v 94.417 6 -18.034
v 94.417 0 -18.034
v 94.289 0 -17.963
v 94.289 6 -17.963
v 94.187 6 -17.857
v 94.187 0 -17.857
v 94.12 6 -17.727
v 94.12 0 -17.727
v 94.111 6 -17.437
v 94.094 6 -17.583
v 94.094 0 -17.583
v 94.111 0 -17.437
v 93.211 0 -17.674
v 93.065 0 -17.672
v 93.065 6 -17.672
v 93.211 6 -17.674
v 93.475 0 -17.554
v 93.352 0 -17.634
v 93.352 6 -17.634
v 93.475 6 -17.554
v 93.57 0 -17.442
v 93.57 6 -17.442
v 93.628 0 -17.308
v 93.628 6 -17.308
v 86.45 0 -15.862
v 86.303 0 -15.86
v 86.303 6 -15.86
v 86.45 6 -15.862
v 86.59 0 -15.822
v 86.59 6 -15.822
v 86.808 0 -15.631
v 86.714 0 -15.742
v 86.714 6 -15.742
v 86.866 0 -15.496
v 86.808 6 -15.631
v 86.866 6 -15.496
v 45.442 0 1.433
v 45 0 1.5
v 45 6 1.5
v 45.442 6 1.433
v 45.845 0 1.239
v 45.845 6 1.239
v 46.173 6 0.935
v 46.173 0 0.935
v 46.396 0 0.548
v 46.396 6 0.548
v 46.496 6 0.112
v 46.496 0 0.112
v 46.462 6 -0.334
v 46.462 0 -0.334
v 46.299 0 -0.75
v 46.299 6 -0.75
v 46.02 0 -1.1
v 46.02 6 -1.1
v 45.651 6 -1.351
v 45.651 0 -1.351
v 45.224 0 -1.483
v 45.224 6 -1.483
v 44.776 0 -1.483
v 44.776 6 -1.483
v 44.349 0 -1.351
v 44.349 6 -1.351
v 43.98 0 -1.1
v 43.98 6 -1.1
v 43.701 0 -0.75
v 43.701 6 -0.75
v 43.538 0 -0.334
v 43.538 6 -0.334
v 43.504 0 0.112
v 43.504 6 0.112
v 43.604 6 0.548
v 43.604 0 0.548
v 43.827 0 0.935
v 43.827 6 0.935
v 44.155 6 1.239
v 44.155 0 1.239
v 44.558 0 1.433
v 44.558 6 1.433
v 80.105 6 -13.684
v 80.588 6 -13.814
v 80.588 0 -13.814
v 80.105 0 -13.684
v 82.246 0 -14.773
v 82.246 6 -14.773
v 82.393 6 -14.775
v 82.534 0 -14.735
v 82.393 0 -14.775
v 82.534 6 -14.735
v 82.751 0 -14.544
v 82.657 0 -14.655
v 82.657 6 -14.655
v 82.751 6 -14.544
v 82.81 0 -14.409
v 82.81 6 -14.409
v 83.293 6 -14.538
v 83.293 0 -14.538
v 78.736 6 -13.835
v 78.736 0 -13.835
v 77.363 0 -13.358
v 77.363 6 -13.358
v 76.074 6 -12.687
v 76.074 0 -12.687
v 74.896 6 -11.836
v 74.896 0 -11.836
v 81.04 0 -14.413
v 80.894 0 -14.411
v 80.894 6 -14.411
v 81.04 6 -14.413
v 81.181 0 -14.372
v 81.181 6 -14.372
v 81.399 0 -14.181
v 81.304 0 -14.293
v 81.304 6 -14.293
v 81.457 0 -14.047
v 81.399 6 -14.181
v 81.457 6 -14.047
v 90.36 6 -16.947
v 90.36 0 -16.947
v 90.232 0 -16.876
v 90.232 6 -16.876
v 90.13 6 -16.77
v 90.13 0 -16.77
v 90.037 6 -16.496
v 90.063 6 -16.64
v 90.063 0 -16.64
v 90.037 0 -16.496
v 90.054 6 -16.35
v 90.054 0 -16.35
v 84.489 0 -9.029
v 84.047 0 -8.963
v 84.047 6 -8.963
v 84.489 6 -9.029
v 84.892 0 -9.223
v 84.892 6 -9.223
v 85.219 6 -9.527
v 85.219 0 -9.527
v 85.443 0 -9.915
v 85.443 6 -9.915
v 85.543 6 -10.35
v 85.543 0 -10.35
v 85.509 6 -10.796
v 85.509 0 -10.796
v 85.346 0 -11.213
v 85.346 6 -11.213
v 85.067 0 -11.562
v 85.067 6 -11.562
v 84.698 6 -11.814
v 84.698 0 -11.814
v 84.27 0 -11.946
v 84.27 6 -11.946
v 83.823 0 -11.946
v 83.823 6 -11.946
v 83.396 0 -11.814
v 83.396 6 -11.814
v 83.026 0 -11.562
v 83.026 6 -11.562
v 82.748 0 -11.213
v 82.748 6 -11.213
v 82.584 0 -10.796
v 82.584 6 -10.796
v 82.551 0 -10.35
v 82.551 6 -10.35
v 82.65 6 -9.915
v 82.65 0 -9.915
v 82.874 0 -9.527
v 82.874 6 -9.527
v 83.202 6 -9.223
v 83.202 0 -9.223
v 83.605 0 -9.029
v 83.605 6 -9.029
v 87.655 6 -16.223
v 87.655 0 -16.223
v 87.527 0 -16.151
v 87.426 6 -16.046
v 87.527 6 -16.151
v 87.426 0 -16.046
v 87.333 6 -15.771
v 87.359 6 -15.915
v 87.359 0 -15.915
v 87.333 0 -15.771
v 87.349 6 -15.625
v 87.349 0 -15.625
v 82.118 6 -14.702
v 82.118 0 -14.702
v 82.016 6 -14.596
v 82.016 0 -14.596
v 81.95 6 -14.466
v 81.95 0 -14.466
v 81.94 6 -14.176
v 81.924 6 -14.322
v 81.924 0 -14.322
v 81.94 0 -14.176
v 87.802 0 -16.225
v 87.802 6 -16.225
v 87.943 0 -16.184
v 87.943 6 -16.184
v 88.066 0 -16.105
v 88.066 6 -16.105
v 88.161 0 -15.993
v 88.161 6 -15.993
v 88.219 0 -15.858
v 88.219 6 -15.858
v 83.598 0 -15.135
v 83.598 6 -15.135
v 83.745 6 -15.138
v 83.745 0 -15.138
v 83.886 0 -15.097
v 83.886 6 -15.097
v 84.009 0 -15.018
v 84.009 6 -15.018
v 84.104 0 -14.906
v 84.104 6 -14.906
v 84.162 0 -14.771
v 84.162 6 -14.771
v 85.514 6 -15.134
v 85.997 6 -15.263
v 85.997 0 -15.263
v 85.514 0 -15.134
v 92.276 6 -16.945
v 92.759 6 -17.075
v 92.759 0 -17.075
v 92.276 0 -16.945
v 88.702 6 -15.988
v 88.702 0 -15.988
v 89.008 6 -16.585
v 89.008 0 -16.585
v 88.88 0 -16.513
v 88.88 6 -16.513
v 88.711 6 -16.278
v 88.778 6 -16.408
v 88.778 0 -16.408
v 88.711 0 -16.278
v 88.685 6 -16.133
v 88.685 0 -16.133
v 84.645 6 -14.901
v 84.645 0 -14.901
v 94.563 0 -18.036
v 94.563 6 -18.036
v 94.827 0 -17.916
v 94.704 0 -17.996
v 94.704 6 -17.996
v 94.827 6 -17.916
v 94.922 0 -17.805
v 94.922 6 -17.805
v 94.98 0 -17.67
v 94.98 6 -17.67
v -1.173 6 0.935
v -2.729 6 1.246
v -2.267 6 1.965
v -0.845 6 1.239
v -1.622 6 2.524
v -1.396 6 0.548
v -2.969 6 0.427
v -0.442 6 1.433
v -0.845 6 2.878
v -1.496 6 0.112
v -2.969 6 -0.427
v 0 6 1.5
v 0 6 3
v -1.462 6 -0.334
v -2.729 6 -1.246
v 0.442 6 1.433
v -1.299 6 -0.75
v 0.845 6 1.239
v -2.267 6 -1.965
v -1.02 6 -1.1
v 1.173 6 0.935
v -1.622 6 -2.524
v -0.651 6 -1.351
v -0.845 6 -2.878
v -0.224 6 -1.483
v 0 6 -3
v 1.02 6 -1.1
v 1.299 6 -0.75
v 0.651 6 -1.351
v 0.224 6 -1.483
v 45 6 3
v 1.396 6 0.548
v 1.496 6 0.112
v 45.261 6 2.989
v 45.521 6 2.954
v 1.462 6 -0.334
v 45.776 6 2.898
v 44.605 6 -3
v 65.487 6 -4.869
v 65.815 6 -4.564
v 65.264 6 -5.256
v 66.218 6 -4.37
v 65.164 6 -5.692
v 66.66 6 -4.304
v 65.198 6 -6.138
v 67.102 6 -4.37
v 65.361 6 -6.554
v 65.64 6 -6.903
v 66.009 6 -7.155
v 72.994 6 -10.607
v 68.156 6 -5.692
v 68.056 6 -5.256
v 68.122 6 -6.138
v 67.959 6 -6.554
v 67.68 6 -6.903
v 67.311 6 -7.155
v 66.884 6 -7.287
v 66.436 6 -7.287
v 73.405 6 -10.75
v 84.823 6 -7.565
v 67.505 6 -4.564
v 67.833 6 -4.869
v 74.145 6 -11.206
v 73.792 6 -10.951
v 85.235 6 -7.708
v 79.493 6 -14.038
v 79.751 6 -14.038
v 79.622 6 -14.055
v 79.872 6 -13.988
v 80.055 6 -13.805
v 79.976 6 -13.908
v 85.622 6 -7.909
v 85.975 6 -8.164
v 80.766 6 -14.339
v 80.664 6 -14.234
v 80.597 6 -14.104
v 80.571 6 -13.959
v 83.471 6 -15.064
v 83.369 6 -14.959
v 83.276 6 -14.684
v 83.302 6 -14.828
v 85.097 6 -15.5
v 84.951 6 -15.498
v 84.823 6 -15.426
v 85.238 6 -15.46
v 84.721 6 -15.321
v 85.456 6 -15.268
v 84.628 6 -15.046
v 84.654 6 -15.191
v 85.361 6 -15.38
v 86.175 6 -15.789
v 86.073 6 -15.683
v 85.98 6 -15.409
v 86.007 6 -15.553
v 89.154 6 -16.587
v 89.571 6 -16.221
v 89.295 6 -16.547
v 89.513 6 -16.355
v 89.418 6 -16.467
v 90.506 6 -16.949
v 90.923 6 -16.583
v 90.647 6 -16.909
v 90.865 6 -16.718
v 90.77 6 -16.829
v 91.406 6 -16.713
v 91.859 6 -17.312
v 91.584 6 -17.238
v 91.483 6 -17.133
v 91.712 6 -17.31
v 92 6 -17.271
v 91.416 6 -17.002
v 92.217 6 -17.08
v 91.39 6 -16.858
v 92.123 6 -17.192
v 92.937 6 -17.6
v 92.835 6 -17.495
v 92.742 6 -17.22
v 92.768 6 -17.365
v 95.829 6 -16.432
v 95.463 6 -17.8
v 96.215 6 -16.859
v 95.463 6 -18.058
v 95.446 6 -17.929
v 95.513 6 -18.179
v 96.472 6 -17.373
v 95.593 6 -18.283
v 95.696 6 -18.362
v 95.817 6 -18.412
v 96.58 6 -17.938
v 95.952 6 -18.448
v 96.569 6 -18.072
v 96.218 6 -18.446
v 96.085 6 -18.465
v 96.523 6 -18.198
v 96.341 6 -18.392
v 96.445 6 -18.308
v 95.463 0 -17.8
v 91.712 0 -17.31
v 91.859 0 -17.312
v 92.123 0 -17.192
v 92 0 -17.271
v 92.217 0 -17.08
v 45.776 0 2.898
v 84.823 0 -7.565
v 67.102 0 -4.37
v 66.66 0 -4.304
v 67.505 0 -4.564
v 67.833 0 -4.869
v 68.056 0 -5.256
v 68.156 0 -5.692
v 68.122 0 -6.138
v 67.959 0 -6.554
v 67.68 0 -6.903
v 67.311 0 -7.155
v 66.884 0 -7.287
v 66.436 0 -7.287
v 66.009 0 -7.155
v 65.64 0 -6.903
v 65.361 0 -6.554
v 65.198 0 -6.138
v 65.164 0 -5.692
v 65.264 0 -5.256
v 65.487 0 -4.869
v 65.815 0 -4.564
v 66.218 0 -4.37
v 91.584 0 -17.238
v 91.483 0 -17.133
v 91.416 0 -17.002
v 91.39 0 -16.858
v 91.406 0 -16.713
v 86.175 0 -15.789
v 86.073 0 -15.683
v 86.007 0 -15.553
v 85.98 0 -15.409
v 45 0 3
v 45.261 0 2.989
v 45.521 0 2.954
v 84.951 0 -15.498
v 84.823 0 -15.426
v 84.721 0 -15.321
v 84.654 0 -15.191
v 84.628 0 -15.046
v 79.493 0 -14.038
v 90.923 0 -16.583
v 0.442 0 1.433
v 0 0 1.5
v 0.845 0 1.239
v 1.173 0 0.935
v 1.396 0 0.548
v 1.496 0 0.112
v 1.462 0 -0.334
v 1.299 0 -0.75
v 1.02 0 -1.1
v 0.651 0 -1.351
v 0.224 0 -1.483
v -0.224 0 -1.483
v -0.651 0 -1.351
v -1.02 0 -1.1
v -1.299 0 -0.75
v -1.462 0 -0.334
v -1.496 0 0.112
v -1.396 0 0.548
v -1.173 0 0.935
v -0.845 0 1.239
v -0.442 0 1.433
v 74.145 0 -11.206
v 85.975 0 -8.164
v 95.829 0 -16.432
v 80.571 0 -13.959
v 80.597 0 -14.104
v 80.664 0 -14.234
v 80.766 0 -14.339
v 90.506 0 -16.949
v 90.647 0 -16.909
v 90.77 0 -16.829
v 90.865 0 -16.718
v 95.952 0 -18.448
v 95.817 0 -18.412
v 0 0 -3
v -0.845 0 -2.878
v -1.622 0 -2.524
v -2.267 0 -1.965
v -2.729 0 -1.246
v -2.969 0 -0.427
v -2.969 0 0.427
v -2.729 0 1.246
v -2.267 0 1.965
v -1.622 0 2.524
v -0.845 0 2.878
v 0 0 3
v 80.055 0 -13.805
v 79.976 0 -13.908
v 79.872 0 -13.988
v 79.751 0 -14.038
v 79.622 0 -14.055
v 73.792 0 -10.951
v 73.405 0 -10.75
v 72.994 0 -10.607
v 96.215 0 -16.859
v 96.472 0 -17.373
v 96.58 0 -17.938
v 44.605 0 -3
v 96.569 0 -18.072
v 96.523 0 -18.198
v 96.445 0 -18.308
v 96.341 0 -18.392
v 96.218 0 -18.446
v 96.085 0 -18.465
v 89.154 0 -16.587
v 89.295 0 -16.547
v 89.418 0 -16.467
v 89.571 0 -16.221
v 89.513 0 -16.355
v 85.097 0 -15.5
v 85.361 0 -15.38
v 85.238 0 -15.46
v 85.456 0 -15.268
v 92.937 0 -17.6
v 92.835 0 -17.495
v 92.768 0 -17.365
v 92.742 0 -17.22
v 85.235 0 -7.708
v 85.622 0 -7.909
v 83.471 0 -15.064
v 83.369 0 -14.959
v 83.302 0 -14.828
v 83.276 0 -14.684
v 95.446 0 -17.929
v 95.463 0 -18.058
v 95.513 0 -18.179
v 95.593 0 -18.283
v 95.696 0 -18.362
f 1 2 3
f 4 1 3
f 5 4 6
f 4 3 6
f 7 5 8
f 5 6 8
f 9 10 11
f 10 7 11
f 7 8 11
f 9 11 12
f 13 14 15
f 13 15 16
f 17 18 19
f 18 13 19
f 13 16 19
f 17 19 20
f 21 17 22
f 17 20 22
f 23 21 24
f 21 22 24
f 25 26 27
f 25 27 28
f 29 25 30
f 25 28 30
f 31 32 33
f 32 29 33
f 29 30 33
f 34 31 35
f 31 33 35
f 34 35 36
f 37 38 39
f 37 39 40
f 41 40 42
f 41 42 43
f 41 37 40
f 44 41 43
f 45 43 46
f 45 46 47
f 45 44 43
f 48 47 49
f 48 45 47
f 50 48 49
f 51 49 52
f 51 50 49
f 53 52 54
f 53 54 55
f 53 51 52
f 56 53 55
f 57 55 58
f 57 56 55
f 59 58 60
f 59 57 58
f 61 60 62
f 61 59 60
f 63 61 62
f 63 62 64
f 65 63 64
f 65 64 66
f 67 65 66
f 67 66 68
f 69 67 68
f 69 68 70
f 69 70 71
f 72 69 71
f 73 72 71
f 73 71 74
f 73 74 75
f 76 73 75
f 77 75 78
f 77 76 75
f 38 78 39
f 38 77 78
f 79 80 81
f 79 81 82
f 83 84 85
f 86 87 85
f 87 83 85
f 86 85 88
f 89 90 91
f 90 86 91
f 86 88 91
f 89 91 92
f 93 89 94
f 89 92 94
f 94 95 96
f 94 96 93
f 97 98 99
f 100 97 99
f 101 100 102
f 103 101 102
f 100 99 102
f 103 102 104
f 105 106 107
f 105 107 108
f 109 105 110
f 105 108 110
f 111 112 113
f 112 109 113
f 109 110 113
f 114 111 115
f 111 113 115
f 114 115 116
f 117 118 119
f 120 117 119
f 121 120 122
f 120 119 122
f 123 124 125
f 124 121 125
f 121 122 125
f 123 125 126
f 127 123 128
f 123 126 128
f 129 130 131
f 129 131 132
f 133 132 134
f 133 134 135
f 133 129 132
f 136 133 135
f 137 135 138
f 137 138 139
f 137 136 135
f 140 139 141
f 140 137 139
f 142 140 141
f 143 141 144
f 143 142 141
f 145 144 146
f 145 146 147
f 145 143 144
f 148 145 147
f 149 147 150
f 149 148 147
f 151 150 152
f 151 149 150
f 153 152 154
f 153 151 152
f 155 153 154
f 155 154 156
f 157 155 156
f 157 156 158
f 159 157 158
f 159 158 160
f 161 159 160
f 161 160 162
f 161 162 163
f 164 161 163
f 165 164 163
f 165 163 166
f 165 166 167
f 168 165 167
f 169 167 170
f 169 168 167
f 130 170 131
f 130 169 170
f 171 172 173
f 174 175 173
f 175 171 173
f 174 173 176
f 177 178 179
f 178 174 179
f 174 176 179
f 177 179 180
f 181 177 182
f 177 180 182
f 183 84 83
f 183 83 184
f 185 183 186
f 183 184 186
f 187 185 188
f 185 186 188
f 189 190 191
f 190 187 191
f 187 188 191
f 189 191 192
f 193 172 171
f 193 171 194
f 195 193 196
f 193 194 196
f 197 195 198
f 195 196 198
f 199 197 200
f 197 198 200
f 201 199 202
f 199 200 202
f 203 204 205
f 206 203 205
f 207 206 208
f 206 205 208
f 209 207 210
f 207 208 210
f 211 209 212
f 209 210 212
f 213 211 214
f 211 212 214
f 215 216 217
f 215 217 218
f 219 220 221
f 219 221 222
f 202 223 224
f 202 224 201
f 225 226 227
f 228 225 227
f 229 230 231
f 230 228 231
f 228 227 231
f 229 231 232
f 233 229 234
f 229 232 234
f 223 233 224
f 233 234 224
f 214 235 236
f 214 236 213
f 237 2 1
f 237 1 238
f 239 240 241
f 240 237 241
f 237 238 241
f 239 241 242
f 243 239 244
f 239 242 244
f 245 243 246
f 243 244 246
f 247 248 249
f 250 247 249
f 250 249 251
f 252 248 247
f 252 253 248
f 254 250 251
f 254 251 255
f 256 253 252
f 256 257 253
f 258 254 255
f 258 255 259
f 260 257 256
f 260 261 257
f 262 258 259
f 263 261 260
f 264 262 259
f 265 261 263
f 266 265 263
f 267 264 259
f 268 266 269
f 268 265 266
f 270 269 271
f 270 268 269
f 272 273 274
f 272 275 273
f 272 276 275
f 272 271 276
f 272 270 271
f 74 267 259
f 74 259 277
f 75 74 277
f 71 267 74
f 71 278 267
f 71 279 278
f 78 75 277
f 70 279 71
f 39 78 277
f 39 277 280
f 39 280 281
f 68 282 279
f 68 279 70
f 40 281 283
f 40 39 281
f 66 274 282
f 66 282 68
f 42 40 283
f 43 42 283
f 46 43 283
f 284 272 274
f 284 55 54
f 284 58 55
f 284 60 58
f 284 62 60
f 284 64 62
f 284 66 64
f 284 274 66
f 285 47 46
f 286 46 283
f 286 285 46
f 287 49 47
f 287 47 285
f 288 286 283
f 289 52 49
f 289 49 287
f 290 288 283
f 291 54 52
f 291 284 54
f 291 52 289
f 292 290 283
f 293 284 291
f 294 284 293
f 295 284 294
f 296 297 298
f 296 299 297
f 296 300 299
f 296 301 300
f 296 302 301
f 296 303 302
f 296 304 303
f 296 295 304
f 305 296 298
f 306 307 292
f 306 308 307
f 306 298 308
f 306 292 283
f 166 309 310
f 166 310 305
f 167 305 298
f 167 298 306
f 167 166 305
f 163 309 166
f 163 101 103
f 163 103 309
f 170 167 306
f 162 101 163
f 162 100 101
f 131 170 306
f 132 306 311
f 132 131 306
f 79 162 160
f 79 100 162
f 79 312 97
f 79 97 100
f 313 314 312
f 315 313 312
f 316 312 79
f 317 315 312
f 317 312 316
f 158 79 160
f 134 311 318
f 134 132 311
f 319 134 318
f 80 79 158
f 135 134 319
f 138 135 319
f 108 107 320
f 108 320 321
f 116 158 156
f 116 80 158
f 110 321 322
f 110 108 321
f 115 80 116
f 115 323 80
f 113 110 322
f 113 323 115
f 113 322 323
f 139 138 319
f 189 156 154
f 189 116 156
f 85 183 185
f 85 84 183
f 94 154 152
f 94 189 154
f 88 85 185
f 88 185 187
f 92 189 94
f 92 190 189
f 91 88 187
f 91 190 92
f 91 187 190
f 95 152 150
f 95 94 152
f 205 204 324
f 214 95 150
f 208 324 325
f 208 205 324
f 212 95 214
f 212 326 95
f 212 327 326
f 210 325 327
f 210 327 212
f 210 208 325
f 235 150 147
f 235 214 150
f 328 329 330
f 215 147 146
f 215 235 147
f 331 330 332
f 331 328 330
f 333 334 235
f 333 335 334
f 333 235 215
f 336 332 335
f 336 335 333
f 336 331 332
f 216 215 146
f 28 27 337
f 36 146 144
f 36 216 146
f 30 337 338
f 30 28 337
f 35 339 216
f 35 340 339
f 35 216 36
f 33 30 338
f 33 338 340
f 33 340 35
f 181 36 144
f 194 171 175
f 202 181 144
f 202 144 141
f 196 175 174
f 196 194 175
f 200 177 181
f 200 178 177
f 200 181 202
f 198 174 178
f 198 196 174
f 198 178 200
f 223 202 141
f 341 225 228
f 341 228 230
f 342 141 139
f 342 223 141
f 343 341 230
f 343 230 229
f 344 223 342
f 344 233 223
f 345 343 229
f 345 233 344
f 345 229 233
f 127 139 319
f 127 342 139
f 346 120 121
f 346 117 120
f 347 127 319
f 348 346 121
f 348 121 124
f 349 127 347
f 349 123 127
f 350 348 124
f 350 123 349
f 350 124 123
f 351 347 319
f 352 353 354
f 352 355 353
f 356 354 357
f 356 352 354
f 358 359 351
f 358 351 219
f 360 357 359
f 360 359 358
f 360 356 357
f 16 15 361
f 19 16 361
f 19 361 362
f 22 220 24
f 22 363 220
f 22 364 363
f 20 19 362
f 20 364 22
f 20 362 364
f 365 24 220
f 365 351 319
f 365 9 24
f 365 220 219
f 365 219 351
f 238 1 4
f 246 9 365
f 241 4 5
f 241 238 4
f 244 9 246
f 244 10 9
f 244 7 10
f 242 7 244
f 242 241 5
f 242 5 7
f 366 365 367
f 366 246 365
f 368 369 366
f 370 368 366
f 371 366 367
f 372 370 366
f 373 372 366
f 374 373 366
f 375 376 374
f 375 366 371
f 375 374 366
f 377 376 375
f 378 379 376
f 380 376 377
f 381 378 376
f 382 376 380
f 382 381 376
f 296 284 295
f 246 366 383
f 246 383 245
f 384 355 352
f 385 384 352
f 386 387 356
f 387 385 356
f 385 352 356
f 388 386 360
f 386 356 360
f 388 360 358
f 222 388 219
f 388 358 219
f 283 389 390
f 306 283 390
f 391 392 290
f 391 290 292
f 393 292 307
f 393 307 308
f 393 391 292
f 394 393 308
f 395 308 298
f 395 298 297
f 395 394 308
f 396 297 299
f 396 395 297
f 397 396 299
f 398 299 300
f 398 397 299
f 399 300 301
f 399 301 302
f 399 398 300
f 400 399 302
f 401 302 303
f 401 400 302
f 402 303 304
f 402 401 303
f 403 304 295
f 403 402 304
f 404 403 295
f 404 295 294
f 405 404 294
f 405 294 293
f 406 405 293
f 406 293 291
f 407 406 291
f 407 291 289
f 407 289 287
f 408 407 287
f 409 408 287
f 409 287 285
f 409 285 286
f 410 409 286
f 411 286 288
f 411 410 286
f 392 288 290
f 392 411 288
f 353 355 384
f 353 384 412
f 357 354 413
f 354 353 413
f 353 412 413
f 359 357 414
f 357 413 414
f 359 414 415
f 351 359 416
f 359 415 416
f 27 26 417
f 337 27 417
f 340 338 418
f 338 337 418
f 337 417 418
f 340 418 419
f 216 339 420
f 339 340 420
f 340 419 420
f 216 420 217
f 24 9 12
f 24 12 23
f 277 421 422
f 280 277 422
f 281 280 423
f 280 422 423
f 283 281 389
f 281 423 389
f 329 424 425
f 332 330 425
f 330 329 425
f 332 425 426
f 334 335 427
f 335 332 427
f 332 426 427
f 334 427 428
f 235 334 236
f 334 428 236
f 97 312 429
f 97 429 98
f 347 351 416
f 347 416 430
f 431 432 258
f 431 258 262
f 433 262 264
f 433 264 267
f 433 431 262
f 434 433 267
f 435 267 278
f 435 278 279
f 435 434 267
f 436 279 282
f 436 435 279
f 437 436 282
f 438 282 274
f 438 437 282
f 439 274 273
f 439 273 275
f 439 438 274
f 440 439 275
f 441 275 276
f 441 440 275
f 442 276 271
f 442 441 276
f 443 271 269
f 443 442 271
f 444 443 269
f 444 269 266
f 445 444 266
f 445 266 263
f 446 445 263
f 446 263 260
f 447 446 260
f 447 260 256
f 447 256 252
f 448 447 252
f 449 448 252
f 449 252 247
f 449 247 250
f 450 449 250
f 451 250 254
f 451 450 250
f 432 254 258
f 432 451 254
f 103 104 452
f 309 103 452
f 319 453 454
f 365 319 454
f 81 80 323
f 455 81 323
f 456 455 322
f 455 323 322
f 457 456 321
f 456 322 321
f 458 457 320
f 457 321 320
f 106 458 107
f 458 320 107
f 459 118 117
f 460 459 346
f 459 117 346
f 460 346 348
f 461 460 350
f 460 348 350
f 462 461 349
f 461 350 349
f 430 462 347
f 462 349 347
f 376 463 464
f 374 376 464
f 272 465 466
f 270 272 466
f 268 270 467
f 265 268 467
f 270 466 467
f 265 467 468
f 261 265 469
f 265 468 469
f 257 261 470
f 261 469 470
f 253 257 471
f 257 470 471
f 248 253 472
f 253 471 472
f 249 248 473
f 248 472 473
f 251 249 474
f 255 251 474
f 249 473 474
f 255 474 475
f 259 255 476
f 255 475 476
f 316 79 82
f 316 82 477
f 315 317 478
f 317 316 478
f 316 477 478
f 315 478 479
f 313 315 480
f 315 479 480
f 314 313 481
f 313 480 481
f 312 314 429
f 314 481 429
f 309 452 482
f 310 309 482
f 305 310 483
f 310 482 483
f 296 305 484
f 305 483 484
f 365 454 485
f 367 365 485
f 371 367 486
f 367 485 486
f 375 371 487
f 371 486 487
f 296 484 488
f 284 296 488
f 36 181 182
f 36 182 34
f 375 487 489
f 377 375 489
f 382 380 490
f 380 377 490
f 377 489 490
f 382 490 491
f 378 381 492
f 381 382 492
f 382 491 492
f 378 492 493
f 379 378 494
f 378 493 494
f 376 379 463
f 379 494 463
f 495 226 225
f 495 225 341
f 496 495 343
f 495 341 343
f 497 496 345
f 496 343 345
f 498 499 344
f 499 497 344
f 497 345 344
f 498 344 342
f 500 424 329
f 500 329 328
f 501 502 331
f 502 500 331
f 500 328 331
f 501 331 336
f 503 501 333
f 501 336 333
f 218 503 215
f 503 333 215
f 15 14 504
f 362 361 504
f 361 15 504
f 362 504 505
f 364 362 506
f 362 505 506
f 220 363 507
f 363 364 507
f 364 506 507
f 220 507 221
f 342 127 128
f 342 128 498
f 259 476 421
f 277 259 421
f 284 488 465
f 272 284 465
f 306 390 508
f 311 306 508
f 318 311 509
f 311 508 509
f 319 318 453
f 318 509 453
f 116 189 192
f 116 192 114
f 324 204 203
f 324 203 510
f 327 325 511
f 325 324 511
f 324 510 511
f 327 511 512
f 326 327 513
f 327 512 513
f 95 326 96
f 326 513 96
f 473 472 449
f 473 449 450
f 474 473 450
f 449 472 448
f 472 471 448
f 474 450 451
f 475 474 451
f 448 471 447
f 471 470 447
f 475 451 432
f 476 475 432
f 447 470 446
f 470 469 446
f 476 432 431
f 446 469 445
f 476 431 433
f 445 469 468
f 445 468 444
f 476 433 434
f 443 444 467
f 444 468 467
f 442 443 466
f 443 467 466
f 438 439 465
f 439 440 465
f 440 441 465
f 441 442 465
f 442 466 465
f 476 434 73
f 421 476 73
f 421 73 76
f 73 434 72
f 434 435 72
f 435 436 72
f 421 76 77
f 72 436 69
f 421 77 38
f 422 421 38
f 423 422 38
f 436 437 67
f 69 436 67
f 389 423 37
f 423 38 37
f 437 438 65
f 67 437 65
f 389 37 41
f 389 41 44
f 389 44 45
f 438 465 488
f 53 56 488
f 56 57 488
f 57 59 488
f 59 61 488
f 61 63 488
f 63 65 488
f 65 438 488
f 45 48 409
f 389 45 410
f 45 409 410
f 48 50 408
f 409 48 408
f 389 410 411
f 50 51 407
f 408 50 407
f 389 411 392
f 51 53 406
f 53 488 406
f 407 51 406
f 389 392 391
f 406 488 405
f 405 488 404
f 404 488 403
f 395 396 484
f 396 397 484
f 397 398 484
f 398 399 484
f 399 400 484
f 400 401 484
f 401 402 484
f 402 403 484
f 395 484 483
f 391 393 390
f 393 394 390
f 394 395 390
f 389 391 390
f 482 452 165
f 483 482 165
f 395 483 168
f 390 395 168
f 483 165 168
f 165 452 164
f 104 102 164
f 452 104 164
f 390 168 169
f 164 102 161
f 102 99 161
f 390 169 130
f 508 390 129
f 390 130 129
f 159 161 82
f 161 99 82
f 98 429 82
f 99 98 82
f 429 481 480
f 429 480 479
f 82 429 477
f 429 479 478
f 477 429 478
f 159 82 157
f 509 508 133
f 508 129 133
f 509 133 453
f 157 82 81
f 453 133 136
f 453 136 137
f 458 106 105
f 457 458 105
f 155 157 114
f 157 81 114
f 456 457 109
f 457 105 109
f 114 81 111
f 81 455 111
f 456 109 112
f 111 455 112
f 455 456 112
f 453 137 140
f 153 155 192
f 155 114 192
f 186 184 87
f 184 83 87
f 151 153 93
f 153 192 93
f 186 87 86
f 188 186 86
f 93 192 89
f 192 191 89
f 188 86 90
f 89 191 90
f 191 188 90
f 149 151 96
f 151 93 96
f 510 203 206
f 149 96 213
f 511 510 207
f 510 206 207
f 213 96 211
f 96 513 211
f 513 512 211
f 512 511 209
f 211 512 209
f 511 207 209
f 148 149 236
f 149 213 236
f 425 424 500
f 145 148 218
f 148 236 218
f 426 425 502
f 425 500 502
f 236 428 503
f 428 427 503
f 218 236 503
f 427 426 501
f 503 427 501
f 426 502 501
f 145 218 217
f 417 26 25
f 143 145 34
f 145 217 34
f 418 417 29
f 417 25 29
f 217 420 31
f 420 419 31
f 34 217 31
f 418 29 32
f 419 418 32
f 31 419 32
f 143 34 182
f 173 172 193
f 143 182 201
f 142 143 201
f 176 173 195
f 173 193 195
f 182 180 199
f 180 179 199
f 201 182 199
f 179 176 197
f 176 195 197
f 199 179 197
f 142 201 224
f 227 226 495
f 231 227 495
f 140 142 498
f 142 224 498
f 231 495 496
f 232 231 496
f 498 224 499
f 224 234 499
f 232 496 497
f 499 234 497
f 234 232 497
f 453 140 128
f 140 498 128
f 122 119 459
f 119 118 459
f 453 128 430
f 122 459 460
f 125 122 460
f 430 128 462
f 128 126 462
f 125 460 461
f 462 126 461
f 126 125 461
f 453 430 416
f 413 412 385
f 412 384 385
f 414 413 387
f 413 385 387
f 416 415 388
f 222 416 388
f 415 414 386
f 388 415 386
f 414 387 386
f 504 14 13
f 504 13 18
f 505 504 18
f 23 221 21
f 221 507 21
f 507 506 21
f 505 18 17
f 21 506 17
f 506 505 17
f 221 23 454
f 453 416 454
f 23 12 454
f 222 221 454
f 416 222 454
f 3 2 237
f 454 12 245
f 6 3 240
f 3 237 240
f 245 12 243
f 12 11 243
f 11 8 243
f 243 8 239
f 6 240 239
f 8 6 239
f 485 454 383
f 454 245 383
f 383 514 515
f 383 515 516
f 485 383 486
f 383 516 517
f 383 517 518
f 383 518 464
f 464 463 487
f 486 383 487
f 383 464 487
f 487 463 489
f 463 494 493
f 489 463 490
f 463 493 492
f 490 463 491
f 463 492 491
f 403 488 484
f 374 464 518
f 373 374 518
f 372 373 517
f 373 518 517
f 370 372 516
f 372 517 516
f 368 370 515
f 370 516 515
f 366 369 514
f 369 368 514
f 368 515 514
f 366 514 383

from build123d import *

# Parameters (mm, degrees)
SKETCH1_R           = 1.5
BOSS_EXTRUDE1_DEPTH = 6
SKETCH2_W           = 0.5
SKETCH2_H           = 6
CUT_EXTRUDE1_DEPTH  = 0.5
FILLET1_R           = 0.5


with BuildPart() as part:
    # Sketch1 → Boss-Extrude1 (new body)
    with BuildSketch(Plane(origin=(0, 0, 0), x_dir=(1, 0, 0), z_dir=(0, 1, 0))):
        with BuildLine():
            ThreePointArc((95.828517615, 16.432423404), (96.485539703, 17.415726447), (96.511338172, 18.598053533))
            Line((96.511338172, 18.598053533), (78.7360041, 13.835167123))
            ThreePointArc((78.7360041, 13.835167123), (76.706708419, 13.046017192), (74.896318454, 11.836353292))
            Line((74.896318454, 11.836353292), (74.145485774, 11.206329867))
            ThreePointArc((74.145485774, 11.206329867), (73.602368785, 10.843430696), (72.99358008, 10.606685717))
            Line((72.99358008, 10.606685717), (44.605042506, 3))
            Line((44.605042506, 3), (0, 3))
            ThreePointArc((0, 3), (-3, 0), (0, -3))
            Line((0, -3), (44.999999999, -3))
            ThreePointArc((44.999999999, -3), (45.391578576, -2.974334584), (45.776457135, -2.897777479))
            Line((45.776457135, -2.897777479), (84.823166373, 7.564756729))
            ThreePointArc((84.823166373, 7.564756729), (85.431955077, 7.801501708), (85.975072067, 8.164400878))
            Line((85.975072067, 8.164400878), (95.828517615, 16.432423404))
        make_face()
        with Locations(Location((66.660044365, 5.803791396, 0), (0, 0, 270))):
            Circle(SKETCH1_R, mode=Mode.SUBTRACT)
        with Locations(Location((84.046709238, 10.462534208, 0), (0, 0, 270))):
            Circle(SKETCH1_R, mode=Mode.SUBTRACT)
        with Locations(Location((44.999999999, 0, 0), (0, 0, 270))):
            Circle(SKETCH1_R, mode=Mode.SUBTRACT)
        with Locations(Location((0, 0, 0), (0, 0, 270))):
            Circle(SKETCH1_R, mode=Mode.SUBTRACT)
    extrude(amount=BOSS_EXTRUDE1_DEPTH)

    # Sketch2 → Cut-Extrude1 (cut)
    with BuildSketch(Plane(origin=(1.815520398, 0, 6.775614366), x_dir=(-0.965925826289068, 0, 0.25881904510252224), z_dir=(-0.2588190451025222, 0, -0.9659258262890679))):
        with Locations((-81.167277896, 3)):
            Rectangle(SKETCH2_W, SKETCH2_H)
        with Locations((-82.567277896, 3)):
            Rectangle(SKETCH2_W, SKETCH2_H)
        with Locations((-83.967277896, 3)):
            Rectangle(SKETCH2_W, SKETCH2_H)
        with Locations((-85.367277896, 3)):
            Rectangle(SKETCH2_W, SKETCH2_H)
        with Locations((-86.767277896, 3)):
            Rectangle(SKETCH2_W, SKETCH2_H)
        with Locations((-88.167277896, 3)):
            Rectangle(SKETCH2_W, SKETCH2_H)
        with Locations((-89.567277896, 3)):
            Rectangle(SKETCH2_W, SKETCH2_H)
        with Locations((-90.967277896, 3)):
            Rectangle(SKETCH2_W, SKETCH2_H)
        with Locations((-92.367277896, 3)):
            Rectangle(SKETCH2_W, SKETCH2_H)
        with Locations((-93.767277896, 3)):
            Rectangle(SKETCH2_W, SKETCH2_H)
        with Locations((-95.167277896, 3)):
            Rectangle(SKETCH2_W, SKETCH2_H)
        with Locations((-96.567277896, 3)):
            Rectangle(SKETCH2_W, SKETCH2_H)
    extrude(amount=-CUT_EXTRUDE1_DEPTH, mode=Mode.SUBTRACT)

    # Fillet1
    # the kernel refuses this fillet: 0.5 mm, written as the material it takes off along each edge
    with BuildSketch(Plane(origin=(79.97560891, -1.25, -14.167318231), x_dir=(-0.9659258262890682, 0, 0.25881904510252096), z_dir=(0, 1, 0)), Plane(origin=(81.81086798, -1.25, -14.659074417), x_dir=(0.25881904510251386, 0, 0.9659258262890702), z_dir=(0, 1, 0)), Plane(origin=(83.163164137, -1.25, -15.02142108), x_dir=(0.2588190451025112, 0, 0.9659258262890709), z_dir=(0, 1, 0)), Plane(origin=(84.515460294, -1.25, -15.383767743), x_dir=(0.25881904510251386, 0, 0.9659258262890702), z_dir=(0, 1, 0)), Plane(origin=(85.86775645, -1.25, -15.746114406), x_dir=(0.25881904510251386, 0, 0.9659258262890702), z_dir=(0, 1, 0)), Plane(origin=(87.220052607, -1.25, -16.108461069), x_dir=(0.25881904510251214, 0, 0.9659258262890708), z_dir=(0, 1, 0)), Plane(origin=(88.572348764, -1.25, -16.470807733), x_dir=(0.25881904510251386, 0, 0.9659258262890702), z_dir=(0, 1, 0)), Plane(origin=(89.924644921, -1.25, -16.833154396), x_dir=(0.25881904510251386, 0, 0.9659258262890702), z_dir=(0, 1, 0)), Plane(origin=(91.276941078, -1.25, -17.195501059), x_dir=(0.25881904510251386, 0, 0.9659258262890702), z_dir=(0, 1, 0)), Plane(origin=(92.629237234, -1.25, -17.557847722), x_dir=(0.25881904510251563, 0, 0.9659258262890698), z_dir=(0, 1, 0)), Plane(origin=(93.981533391, -1.25, -17.920194385), x_dir=(0.25881904510251563, 0, 0.9659258262890698), z_dir=(0, 1, 0))) as fillet1_piece_1:
        with BuildLine():
            CenterArc((FILLET1_R, FILLET1_R), FILLET1_R, 180, 90)
            Line((0, FILLET1_R), (0, 0))
            Line((0, 0), (FILLET1_R, 0))
        make_face()
    extrude(amount=8.5, mode=Mode.SUBTRACT)
    with BuildSketch(Plane(origin=(95.333829548, -1.25, -18.282541048), x_dir=(0.9659258262890649, 0, -0.2588190451025338), z_dir=(0, 1, 0)), Plane(origin=(80.458571823, 7.25, -14.296727754), x_dir=(0.25881904510251386, 0, 0.9659258262890702), z_dir=(0, -1, 0)), Plane(origin=(81.327905067, 7.25, -14.529664894), x_dir=(-0.9659258262890683, 0, 0.25881904510252046), z_dir=(0, -1, 0)), Plane(origin=(82.680201224, 7.25, -14.892011557), x_dir=(-0.9659258262890675, 0, 0.2588190451025238), z_dir=(0, -1, 0)), Plane(origin=(84.03249738, 7.25, -15.254358221), x_dir=(-0.9659258262890682, 0, 0.25881904510252096), z_dir=(0, -1, 0)), Plane(origin=(85.384793537, 7.25, -15.616704884), x_dir=(-0.9659258262890675, 0, 0.2588190451025238), z_dir=(0, -1, 0)), Plane(origin=(86.737089694, 7.25, -15.979051547), x_dir=(-0.9659258262890683, 0, 0.25881904510252046), z_dir=(0, -1, 0)), Plane(origin=(88.089385851, 7.25, -16.34139821), x_dir=(-0.9659258262890683, 0, 0.25881904510252046), z_dir=(0, -1, 0)), Plane(origin=(89.441682008, 7.25, -16.703744873), x_dir=(-0.9659258262890704, 0, 0.2588190451025134), z_dir=(0, -1, 0)), Plane(origin=(90.793978164, 7.25, -17.066091536), x_dir=(-0.9659258262890683, 0, 0.25881904510252046), z_dir=(0, -1, 0)), Plane(origin=(92.146274321, 7.25, -17.428438199), x_dir=(-0.9659258262890701, 0, 0.25881904510251436), z_dir=(0, -1, 0)), Plane(origin=(93.498570478, 7.25, -17.790784863), x_dir=(-0.9659258262890682, 0, 0.25881904510252096), z_dir=(0, -1, 0)), Plane(origin=(94.850866635, 7.25, -18.153131526), x_dir=(-0.9659258262890702, 0, 0.25881904510251386), z_dir=(0, -1, 0))) as fillet1_piece_2:
        with BuildLine():
            CenterArc((FILLET1_R, -FILLET1_R), FILLET1_R, 90, 90)
            Line((0, -FILLET1_R), (0, 0))
            Line((0, 0), (FILLET1_R, 0))
        make_face()
    extrude(amount=8.5, mode=Mode.SUBTRACT)
    with BuildSketch(Plane(origin=(96.511338172, -1.657996846, -18.598053533), x_dir=(0.10403330319637054, 0, 0.9945738141666772), z_dir=(0, 1, 0))) as fillet1_piece_3:
        with BuildLine():
            CenterArc((0.584735643, -0.493805167), FILLET1_R, 80.97147389, 108.05705222)
            Line((0.090930477, -0.572268262), (0, 0))
            ThreePointArc((0, 0), (0.331599369, 0.026180497), (0.663198739, 0))
        make_face()
    extrude(amount=9.315993693, mode=Mode.SUBTRACT)


solid = part.part
